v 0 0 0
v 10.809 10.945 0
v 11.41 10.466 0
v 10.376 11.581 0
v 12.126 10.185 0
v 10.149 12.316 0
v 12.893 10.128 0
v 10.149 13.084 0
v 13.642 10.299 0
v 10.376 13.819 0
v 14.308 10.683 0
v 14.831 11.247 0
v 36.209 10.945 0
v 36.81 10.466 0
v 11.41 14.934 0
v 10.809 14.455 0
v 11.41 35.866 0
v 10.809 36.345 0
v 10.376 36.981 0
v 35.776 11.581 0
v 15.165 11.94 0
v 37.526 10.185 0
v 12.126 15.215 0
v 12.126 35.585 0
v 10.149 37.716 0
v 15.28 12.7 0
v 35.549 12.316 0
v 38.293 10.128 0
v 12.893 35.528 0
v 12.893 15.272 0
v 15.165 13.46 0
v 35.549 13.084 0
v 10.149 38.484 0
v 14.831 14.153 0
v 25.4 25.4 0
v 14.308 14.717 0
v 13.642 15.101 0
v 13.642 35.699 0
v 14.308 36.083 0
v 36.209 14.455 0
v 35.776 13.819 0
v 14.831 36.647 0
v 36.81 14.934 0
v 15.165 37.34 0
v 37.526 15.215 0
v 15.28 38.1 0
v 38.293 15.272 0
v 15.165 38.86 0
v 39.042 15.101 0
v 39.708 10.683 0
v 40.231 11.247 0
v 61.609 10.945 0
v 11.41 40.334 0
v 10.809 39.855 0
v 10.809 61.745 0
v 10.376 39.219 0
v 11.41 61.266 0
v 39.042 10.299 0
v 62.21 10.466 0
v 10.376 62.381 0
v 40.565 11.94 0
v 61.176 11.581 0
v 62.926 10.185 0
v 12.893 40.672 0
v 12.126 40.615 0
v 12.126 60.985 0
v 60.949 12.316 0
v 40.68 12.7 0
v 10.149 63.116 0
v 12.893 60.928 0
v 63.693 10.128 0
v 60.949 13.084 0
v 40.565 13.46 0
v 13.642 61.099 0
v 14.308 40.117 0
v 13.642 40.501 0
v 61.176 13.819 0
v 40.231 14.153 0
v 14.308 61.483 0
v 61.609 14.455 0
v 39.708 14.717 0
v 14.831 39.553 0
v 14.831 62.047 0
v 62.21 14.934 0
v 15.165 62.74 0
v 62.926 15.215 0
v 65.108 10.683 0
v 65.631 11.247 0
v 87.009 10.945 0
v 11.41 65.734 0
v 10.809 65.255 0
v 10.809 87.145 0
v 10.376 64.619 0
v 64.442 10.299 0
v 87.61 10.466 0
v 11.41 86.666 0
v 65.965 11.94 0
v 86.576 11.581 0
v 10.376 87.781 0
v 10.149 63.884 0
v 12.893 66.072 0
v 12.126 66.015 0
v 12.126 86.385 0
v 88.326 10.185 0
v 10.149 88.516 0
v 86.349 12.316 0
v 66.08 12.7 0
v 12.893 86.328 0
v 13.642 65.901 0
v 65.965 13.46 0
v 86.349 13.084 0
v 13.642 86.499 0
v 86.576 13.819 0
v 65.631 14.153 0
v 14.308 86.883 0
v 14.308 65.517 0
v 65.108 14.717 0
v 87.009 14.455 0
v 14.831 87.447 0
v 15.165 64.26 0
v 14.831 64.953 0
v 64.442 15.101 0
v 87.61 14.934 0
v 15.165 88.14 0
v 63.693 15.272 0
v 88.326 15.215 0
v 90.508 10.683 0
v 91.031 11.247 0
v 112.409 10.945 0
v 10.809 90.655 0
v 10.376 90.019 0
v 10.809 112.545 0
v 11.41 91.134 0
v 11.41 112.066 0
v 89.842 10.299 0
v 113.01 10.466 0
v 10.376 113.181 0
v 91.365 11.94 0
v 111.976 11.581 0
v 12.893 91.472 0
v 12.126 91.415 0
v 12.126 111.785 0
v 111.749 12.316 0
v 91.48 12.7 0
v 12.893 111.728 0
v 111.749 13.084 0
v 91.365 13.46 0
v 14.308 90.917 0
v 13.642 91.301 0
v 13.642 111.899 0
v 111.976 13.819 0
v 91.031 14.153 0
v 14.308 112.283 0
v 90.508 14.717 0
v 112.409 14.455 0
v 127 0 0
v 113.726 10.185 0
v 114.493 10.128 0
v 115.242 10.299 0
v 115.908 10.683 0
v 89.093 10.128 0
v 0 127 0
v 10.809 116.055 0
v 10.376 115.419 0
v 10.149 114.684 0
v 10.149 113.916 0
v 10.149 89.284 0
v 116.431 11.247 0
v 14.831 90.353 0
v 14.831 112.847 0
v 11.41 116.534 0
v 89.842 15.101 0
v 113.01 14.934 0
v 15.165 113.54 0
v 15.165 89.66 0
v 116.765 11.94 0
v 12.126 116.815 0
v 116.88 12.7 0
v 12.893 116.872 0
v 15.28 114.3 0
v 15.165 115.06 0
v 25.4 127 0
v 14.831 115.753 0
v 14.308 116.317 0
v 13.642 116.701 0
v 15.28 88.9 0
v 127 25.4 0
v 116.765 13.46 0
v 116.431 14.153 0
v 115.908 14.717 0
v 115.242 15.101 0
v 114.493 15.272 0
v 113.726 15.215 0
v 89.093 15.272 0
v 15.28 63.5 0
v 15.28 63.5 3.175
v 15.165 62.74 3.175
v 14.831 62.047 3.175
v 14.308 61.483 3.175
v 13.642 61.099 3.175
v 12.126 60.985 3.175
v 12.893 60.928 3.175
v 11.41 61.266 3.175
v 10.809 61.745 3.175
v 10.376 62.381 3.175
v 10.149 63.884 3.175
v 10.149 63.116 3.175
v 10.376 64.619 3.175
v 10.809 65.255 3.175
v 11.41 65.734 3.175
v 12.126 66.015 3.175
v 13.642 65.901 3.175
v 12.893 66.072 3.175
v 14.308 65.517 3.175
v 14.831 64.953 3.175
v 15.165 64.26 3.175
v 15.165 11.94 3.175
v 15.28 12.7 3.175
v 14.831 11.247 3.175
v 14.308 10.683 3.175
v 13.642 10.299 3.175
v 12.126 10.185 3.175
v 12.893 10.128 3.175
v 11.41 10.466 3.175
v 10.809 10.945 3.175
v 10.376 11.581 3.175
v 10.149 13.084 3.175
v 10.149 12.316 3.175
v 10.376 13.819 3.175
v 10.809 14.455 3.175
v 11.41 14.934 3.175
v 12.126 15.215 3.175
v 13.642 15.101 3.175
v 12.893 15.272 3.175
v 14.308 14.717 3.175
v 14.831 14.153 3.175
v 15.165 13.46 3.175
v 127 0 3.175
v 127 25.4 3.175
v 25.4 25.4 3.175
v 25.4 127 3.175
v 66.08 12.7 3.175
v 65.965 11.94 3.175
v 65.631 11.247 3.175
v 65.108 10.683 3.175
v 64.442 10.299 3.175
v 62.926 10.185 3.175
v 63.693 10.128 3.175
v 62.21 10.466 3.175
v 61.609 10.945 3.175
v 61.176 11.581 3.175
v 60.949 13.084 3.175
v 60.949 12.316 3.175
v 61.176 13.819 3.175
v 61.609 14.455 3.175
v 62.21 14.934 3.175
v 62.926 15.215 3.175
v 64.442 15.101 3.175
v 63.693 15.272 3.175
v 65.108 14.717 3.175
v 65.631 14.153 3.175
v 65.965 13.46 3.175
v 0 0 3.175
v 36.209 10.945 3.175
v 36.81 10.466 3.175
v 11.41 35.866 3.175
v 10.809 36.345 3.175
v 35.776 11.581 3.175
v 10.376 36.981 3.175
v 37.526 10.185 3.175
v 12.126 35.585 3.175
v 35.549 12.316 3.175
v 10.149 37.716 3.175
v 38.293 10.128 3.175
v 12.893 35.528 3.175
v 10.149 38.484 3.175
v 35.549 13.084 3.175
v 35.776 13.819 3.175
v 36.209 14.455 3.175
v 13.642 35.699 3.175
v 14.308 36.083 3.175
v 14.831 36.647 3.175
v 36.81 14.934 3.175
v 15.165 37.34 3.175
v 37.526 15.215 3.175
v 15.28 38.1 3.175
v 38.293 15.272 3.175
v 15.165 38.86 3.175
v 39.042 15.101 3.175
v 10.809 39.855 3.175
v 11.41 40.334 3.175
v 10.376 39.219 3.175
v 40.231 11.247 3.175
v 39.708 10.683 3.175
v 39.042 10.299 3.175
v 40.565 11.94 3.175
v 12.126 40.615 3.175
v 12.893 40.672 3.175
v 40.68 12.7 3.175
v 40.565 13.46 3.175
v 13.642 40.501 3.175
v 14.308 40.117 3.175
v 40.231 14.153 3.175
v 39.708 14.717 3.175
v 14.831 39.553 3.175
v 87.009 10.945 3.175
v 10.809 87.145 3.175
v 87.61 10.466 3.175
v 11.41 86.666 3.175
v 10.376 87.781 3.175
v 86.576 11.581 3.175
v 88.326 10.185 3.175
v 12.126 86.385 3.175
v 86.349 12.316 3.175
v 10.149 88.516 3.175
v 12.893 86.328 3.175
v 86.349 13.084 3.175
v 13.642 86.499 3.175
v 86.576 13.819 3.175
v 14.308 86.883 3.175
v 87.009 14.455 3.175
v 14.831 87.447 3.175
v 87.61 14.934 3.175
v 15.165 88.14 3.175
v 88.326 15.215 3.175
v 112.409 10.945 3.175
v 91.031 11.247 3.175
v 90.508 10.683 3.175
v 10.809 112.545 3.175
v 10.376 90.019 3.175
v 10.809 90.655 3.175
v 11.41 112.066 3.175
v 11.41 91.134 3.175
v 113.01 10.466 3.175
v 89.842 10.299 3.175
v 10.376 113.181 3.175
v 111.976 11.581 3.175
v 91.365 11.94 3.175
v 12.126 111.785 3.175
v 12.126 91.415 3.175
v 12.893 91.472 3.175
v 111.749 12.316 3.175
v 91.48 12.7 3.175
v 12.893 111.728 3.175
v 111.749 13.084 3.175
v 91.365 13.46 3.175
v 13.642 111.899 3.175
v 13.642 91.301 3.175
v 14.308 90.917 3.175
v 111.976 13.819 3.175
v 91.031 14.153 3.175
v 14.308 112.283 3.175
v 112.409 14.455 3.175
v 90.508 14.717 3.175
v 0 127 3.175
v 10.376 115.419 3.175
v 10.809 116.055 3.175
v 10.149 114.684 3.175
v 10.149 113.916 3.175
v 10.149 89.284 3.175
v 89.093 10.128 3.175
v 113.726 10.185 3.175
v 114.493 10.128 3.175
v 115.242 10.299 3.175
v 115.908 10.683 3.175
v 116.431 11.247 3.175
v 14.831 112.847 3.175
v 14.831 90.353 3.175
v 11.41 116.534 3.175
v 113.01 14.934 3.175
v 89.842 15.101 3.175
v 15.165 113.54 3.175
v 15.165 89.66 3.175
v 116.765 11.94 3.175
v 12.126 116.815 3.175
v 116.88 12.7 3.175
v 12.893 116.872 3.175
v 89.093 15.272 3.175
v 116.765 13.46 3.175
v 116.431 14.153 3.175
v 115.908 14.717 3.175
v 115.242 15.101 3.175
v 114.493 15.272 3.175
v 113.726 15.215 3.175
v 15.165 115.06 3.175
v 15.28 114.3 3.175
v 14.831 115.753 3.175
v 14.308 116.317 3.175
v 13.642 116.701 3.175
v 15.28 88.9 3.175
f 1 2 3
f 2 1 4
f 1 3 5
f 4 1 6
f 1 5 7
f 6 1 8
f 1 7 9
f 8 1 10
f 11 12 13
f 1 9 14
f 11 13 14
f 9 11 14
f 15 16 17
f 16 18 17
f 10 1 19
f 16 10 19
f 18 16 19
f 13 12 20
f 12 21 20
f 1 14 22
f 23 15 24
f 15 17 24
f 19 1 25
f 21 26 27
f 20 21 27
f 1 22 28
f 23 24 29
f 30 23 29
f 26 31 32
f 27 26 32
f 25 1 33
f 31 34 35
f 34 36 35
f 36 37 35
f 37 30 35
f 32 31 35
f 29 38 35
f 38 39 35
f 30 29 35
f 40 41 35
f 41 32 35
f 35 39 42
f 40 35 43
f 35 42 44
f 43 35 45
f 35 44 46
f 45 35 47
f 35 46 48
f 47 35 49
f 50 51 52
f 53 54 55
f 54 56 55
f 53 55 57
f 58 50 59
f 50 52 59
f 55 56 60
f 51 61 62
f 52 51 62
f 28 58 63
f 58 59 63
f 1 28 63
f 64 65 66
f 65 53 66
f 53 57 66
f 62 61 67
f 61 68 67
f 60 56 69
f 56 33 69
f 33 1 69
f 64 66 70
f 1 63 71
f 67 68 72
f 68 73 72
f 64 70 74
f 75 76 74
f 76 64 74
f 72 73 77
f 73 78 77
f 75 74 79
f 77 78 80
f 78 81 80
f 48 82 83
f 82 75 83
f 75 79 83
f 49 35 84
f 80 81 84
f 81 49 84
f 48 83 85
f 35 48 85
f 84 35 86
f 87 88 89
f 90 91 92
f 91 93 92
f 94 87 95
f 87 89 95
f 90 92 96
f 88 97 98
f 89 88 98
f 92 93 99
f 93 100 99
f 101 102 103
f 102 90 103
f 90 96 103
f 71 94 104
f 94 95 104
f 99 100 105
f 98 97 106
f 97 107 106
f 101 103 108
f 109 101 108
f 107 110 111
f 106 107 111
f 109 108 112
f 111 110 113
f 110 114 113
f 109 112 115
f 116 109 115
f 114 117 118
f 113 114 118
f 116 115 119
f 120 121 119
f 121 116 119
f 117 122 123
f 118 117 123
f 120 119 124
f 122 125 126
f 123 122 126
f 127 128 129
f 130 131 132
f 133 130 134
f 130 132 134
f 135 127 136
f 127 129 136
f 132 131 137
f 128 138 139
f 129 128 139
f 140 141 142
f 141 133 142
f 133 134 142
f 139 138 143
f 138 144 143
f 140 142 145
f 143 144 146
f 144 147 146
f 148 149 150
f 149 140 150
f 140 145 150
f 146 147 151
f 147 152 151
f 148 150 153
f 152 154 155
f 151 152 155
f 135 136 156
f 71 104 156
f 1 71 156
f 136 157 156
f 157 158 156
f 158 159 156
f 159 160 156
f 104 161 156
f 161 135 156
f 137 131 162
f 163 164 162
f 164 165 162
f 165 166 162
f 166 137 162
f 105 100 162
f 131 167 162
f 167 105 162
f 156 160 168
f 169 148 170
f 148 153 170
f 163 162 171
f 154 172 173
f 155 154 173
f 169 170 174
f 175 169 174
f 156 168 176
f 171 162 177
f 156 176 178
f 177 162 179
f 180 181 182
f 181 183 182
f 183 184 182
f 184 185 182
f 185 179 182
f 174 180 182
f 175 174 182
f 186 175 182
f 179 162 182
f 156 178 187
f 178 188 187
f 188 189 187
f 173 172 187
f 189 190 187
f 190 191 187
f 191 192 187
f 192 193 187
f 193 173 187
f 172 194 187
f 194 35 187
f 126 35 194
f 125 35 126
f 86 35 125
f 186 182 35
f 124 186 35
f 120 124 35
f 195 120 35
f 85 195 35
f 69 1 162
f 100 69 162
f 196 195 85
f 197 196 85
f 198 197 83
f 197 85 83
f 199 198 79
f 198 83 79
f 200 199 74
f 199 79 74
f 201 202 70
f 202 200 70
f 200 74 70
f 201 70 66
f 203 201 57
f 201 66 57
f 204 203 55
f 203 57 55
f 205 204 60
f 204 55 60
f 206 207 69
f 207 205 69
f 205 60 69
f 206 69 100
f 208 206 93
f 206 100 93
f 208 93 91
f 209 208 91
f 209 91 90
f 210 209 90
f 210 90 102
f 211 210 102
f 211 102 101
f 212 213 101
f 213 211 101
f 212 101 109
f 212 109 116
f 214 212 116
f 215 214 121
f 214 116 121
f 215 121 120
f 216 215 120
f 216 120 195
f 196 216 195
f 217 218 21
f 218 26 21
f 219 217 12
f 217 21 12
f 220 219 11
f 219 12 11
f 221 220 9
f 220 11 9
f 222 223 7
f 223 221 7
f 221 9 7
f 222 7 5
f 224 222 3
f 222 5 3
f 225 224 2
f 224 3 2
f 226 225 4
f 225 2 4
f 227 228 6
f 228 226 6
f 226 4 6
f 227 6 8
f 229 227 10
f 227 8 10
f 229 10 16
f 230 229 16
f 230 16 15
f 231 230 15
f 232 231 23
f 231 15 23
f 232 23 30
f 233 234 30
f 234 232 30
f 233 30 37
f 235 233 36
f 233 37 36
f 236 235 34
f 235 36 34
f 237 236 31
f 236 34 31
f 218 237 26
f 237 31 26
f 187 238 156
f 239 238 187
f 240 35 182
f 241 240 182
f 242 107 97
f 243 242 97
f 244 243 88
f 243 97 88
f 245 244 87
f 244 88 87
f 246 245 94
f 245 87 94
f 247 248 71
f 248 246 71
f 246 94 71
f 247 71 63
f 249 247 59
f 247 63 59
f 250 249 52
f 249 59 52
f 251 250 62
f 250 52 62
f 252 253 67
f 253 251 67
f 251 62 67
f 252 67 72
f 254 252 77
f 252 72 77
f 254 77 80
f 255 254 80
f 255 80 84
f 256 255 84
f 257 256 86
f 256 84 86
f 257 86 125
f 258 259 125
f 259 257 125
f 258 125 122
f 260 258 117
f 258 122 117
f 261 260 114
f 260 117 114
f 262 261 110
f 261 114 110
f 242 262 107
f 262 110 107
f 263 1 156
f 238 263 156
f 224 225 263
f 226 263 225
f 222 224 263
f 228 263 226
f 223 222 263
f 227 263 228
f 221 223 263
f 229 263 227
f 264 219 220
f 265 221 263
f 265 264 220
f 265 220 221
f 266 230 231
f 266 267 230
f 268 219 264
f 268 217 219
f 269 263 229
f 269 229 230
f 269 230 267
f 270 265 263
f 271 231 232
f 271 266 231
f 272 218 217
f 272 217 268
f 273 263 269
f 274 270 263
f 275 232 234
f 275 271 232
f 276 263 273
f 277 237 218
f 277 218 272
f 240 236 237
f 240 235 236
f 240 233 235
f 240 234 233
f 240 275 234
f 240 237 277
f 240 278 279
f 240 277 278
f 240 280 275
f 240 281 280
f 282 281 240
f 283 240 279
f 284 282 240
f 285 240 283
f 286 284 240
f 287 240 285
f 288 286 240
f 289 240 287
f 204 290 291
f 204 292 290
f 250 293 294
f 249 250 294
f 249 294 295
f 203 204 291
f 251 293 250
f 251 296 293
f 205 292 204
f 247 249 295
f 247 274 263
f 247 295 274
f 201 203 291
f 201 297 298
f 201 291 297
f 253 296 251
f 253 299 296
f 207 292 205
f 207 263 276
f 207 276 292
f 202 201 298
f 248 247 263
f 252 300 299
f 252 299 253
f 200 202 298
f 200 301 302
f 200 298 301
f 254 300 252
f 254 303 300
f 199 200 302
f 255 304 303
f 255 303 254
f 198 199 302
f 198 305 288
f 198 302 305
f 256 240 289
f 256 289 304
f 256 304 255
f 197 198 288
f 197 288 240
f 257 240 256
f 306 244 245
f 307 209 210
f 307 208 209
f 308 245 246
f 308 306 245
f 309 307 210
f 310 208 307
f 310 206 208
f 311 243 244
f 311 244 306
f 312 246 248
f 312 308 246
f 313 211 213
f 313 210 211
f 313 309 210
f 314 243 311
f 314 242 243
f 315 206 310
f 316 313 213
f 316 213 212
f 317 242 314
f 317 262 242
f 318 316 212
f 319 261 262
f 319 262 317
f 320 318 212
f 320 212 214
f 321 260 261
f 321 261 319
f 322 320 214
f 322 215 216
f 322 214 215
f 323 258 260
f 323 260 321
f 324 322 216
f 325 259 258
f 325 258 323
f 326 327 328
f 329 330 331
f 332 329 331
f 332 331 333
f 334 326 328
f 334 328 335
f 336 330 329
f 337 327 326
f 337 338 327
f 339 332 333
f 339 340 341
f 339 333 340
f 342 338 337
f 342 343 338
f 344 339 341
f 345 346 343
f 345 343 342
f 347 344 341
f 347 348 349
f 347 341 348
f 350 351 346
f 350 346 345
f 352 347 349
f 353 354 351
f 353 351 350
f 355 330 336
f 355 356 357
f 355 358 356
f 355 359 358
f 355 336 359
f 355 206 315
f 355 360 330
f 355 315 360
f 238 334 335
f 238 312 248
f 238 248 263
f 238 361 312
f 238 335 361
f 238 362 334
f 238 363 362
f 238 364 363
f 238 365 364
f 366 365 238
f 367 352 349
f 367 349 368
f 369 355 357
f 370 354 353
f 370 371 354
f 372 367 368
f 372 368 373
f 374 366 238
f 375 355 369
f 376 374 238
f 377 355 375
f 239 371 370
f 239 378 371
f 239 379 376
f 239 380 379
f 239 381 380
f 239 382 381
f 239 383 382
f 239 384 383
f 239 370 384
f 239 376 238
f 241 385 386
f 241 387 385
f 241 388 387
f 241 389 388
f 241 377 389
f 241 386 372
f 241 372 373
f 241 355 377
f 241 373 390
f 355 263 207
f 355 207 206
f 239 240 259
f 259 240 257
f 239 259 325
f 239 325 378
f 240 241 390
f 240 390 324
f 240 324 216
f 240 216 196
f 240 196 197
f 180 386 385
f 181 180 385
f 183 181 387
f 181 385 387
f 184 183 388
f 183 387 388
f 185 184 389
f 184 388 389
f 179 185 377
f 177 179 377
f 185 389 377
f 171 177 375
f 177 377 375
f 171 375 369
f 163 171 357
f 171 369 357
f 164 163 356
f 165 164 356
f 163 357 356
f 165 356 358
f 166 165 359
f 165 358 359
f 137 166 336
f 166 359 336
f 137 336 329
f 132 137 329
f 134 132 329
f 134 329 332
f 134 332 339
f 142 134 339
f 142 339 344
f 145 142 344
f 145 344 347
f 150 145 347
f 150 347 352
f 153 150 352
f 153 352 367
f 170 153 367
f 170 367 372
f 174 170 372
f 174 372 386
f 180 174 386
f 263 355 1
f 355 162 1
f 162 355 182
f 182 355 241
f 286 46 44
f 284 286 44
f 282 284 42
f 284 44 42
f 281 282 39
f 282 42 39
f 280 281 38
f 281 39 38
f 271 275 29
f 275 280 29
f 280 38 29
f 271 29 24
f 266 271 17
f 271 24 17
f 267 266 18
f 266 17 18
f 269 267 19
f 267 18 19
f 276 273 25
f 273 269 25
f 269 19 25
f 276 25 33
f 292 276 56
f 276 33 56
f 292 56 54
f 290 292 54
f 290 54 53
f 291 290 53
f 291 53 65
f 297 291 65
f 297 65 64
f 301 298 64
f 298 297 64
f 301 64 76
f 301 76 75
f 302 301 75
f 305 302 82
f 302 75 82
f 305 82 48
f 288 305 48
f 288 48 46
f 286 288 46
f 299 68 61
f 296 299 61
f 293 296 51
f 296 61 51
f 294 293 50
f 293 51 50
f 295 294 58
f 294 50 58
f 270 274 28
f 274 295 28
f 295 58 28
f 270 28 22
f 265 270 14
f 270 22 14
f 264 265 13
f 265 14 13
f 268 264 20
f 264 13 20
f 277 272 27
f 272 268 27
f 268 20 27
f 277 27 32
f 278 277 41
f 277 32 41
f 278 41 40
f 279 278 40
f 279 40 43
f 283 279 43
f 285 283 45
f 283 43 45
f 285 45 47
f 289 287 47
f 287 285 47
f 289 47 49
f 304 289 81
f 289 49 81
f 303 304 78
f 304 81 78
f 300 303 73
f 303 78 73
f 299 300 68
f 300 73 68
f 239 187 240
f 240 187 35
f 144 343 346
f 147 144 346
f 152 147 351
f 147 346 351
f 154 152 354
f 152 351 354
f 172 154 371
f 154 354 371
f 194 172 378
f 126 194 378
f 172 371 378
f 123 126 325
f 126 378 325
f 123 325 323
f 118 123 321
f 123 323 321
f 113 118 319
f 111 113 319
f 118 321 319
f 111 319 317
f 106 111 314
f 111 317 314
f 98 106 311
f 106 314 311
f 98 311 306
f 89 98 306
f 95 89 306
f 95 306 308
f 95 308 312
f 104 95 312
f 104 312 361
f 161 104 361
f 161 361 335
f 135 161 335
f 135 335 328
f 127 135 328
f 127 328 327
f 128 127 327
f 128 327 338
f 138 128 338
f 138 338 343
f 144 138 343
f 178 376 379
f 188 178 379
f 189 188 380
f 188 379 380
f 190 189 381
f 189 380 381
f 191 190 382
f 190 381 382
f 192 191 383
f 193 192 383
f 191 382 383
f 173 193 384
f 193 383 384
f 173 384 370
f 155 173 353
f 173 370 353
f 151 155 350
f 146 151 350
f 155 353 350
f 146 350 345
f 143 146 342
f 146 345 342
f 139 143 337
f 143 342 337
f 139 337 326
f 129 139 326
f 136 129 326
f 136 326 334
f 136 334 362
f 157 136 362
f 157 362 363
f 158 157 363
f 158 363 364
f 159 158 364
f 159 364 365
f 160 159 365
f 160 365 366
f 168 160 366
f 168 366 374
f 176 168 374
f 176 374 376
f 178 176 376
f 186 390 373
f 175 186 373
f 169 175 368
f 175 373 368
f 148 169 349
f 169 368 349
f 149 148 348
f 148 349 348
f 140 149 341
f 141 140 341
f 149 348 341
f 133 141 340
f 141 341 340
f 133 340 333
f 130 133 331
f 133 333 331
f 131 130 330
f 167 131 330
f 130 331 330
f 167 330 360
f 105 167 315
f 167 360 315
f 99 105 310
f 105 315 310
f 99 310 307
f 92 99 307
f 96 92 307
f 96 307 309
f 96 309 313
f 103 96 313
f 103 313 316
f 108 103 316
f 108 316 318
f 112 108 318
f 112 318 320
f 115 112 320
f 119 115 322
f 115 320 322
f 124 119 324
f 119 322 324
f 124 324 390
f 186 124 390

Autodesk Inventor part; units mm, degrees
ref_plane "YZ Plane" through (0, 0, 0) normal (1, 0, 0) x (0, 1, 0)
ref_plane "XZ Plane" through (0, 0, 0) normal (0, 1, 0) x (-1, 0, 0)
ref_plane "XY Plane" through (0, 0, 0) normal (0, 0, 1) x (1, 0, 0)
sketch "Sketch1" plane through (0, 0, 0) normal (0, 0, 1) x (1, 0, 0)
  line L0 (0, 0) -> (76.2, 0)
  line L1 (76.2, 0) -> (76.2, 25.4)
  line L2 (76.2, 25.4) -> (25.4, 25.4)
  line L3 (0, 25.4) -> (0, 0)
  line L4 (0, 0) -> (25.4, 0)
  line L5 (25.4, 25.4) -> (25.4, 76.2)
  line L6 (25.4, 76.2) -> (0, 76.2)
  line L7 (0, 76.2) -> (0, 0)
  line L8 (12.7, 76.2) -> (12.7, 63.5) construction
  line L9 (12.7, 63.5) -> (12.7, 38.1) construction
  line L10 (12.7, 38.1) -> (12.7, 12.7) construction
  line L11 (12.7, 12.7) -> (38.1, 12.7) construction
  line L12 (38.1, 12.7) -> (63.5, 12.7) construction
  circle A0 centre (12.7, 63.5) radius 2.5797
  circle A1 centre (12.7, 38.1) radius 2.5797
  circle A2 centre (12.7, 12.7) radius 2.5797
  circle A3 centre (38.1, 12.7) radius 2.5797
  circle A4 centre (63.5, 12.7) radius 2.5797
  dimension "d0" = 76.2
  dimension "d1" = 25.4
  dimension "d2" = 25.4
  dimension "d3" = 76.2
  dimension "d4" = 12.7
  dimension "d5" = 25.4
  dimension "d6" = 25.4
  dimension "d7" = 25.4
  dimension "d8" = 25.4
  dimension "d9" = 5.1594
extrude "Extrusion1" add sketch "Sketch1" along normal blind 3.175
sketch "Sketch2" plane through (0, 0, 3.175) normal (0, 0, 1) x (1, 0, 0)
  circle A0 centre (12.7, 63.5) radius 2.5797 construction
  line L0 (12.7, 63.5) -> (12.7, 88.9) construction
  line L1 (12.7, 88.9) -> (12.7, 114.3) construction
  circle A1 centre (63.5, 12.7) radius 2.5797 construction
  line L2 (63.5, 12.7) -> (88.9, 12.7) construction
  line L3 (88.9, 12.7) -> (114.3, 12.7) construction
  circle A2 centre (88.9, 12.7) radius 2.5797
  circle A3 centre (114.3, 12.7) radius 2.5797
  circle A4 centre (12.7, 88.9) radius 2.5797
  circle A5 centre (12.7, 114.3) radius 2.5797
  line L4 (0, 76.2) -> (0, 0) projected
  line L5 (0, 76.2) -> (0, 127)
  line L6 (0, 127) -> (25.4, 127)
  line L7 (25.4, 25.4) -> (25.4, 76.2) projected
  line L8 (25.4, 127) -> (25.4, 76.2)
  line L9 (25.4, 76.2) -> (0, 76.2)
  line L10 (76.2, 0) -> (76.2, 25.4) projected
  line L11 (76.2, 25.4) -> (76.2, 0)
  line L12 (76.2, 0) -> (127, 0)
  line L13 (127, 0) -> (127, 25.4)
  line L14 (127, 25.4) -> (76.2, 25.4)
  dimension "d12" = 25.4
  dimension "d13" = 25.4
  dimension "d14" = 25.4
  dimension "d15" = 25.4
  dimension "d16" = 50.8
  dimension "d17" = 25.4
  dimension "d18" = 50.8
extrude "Extrusion2" add sketch "Sketch2" against normal blind 3.175
properties part number "L gusset"
